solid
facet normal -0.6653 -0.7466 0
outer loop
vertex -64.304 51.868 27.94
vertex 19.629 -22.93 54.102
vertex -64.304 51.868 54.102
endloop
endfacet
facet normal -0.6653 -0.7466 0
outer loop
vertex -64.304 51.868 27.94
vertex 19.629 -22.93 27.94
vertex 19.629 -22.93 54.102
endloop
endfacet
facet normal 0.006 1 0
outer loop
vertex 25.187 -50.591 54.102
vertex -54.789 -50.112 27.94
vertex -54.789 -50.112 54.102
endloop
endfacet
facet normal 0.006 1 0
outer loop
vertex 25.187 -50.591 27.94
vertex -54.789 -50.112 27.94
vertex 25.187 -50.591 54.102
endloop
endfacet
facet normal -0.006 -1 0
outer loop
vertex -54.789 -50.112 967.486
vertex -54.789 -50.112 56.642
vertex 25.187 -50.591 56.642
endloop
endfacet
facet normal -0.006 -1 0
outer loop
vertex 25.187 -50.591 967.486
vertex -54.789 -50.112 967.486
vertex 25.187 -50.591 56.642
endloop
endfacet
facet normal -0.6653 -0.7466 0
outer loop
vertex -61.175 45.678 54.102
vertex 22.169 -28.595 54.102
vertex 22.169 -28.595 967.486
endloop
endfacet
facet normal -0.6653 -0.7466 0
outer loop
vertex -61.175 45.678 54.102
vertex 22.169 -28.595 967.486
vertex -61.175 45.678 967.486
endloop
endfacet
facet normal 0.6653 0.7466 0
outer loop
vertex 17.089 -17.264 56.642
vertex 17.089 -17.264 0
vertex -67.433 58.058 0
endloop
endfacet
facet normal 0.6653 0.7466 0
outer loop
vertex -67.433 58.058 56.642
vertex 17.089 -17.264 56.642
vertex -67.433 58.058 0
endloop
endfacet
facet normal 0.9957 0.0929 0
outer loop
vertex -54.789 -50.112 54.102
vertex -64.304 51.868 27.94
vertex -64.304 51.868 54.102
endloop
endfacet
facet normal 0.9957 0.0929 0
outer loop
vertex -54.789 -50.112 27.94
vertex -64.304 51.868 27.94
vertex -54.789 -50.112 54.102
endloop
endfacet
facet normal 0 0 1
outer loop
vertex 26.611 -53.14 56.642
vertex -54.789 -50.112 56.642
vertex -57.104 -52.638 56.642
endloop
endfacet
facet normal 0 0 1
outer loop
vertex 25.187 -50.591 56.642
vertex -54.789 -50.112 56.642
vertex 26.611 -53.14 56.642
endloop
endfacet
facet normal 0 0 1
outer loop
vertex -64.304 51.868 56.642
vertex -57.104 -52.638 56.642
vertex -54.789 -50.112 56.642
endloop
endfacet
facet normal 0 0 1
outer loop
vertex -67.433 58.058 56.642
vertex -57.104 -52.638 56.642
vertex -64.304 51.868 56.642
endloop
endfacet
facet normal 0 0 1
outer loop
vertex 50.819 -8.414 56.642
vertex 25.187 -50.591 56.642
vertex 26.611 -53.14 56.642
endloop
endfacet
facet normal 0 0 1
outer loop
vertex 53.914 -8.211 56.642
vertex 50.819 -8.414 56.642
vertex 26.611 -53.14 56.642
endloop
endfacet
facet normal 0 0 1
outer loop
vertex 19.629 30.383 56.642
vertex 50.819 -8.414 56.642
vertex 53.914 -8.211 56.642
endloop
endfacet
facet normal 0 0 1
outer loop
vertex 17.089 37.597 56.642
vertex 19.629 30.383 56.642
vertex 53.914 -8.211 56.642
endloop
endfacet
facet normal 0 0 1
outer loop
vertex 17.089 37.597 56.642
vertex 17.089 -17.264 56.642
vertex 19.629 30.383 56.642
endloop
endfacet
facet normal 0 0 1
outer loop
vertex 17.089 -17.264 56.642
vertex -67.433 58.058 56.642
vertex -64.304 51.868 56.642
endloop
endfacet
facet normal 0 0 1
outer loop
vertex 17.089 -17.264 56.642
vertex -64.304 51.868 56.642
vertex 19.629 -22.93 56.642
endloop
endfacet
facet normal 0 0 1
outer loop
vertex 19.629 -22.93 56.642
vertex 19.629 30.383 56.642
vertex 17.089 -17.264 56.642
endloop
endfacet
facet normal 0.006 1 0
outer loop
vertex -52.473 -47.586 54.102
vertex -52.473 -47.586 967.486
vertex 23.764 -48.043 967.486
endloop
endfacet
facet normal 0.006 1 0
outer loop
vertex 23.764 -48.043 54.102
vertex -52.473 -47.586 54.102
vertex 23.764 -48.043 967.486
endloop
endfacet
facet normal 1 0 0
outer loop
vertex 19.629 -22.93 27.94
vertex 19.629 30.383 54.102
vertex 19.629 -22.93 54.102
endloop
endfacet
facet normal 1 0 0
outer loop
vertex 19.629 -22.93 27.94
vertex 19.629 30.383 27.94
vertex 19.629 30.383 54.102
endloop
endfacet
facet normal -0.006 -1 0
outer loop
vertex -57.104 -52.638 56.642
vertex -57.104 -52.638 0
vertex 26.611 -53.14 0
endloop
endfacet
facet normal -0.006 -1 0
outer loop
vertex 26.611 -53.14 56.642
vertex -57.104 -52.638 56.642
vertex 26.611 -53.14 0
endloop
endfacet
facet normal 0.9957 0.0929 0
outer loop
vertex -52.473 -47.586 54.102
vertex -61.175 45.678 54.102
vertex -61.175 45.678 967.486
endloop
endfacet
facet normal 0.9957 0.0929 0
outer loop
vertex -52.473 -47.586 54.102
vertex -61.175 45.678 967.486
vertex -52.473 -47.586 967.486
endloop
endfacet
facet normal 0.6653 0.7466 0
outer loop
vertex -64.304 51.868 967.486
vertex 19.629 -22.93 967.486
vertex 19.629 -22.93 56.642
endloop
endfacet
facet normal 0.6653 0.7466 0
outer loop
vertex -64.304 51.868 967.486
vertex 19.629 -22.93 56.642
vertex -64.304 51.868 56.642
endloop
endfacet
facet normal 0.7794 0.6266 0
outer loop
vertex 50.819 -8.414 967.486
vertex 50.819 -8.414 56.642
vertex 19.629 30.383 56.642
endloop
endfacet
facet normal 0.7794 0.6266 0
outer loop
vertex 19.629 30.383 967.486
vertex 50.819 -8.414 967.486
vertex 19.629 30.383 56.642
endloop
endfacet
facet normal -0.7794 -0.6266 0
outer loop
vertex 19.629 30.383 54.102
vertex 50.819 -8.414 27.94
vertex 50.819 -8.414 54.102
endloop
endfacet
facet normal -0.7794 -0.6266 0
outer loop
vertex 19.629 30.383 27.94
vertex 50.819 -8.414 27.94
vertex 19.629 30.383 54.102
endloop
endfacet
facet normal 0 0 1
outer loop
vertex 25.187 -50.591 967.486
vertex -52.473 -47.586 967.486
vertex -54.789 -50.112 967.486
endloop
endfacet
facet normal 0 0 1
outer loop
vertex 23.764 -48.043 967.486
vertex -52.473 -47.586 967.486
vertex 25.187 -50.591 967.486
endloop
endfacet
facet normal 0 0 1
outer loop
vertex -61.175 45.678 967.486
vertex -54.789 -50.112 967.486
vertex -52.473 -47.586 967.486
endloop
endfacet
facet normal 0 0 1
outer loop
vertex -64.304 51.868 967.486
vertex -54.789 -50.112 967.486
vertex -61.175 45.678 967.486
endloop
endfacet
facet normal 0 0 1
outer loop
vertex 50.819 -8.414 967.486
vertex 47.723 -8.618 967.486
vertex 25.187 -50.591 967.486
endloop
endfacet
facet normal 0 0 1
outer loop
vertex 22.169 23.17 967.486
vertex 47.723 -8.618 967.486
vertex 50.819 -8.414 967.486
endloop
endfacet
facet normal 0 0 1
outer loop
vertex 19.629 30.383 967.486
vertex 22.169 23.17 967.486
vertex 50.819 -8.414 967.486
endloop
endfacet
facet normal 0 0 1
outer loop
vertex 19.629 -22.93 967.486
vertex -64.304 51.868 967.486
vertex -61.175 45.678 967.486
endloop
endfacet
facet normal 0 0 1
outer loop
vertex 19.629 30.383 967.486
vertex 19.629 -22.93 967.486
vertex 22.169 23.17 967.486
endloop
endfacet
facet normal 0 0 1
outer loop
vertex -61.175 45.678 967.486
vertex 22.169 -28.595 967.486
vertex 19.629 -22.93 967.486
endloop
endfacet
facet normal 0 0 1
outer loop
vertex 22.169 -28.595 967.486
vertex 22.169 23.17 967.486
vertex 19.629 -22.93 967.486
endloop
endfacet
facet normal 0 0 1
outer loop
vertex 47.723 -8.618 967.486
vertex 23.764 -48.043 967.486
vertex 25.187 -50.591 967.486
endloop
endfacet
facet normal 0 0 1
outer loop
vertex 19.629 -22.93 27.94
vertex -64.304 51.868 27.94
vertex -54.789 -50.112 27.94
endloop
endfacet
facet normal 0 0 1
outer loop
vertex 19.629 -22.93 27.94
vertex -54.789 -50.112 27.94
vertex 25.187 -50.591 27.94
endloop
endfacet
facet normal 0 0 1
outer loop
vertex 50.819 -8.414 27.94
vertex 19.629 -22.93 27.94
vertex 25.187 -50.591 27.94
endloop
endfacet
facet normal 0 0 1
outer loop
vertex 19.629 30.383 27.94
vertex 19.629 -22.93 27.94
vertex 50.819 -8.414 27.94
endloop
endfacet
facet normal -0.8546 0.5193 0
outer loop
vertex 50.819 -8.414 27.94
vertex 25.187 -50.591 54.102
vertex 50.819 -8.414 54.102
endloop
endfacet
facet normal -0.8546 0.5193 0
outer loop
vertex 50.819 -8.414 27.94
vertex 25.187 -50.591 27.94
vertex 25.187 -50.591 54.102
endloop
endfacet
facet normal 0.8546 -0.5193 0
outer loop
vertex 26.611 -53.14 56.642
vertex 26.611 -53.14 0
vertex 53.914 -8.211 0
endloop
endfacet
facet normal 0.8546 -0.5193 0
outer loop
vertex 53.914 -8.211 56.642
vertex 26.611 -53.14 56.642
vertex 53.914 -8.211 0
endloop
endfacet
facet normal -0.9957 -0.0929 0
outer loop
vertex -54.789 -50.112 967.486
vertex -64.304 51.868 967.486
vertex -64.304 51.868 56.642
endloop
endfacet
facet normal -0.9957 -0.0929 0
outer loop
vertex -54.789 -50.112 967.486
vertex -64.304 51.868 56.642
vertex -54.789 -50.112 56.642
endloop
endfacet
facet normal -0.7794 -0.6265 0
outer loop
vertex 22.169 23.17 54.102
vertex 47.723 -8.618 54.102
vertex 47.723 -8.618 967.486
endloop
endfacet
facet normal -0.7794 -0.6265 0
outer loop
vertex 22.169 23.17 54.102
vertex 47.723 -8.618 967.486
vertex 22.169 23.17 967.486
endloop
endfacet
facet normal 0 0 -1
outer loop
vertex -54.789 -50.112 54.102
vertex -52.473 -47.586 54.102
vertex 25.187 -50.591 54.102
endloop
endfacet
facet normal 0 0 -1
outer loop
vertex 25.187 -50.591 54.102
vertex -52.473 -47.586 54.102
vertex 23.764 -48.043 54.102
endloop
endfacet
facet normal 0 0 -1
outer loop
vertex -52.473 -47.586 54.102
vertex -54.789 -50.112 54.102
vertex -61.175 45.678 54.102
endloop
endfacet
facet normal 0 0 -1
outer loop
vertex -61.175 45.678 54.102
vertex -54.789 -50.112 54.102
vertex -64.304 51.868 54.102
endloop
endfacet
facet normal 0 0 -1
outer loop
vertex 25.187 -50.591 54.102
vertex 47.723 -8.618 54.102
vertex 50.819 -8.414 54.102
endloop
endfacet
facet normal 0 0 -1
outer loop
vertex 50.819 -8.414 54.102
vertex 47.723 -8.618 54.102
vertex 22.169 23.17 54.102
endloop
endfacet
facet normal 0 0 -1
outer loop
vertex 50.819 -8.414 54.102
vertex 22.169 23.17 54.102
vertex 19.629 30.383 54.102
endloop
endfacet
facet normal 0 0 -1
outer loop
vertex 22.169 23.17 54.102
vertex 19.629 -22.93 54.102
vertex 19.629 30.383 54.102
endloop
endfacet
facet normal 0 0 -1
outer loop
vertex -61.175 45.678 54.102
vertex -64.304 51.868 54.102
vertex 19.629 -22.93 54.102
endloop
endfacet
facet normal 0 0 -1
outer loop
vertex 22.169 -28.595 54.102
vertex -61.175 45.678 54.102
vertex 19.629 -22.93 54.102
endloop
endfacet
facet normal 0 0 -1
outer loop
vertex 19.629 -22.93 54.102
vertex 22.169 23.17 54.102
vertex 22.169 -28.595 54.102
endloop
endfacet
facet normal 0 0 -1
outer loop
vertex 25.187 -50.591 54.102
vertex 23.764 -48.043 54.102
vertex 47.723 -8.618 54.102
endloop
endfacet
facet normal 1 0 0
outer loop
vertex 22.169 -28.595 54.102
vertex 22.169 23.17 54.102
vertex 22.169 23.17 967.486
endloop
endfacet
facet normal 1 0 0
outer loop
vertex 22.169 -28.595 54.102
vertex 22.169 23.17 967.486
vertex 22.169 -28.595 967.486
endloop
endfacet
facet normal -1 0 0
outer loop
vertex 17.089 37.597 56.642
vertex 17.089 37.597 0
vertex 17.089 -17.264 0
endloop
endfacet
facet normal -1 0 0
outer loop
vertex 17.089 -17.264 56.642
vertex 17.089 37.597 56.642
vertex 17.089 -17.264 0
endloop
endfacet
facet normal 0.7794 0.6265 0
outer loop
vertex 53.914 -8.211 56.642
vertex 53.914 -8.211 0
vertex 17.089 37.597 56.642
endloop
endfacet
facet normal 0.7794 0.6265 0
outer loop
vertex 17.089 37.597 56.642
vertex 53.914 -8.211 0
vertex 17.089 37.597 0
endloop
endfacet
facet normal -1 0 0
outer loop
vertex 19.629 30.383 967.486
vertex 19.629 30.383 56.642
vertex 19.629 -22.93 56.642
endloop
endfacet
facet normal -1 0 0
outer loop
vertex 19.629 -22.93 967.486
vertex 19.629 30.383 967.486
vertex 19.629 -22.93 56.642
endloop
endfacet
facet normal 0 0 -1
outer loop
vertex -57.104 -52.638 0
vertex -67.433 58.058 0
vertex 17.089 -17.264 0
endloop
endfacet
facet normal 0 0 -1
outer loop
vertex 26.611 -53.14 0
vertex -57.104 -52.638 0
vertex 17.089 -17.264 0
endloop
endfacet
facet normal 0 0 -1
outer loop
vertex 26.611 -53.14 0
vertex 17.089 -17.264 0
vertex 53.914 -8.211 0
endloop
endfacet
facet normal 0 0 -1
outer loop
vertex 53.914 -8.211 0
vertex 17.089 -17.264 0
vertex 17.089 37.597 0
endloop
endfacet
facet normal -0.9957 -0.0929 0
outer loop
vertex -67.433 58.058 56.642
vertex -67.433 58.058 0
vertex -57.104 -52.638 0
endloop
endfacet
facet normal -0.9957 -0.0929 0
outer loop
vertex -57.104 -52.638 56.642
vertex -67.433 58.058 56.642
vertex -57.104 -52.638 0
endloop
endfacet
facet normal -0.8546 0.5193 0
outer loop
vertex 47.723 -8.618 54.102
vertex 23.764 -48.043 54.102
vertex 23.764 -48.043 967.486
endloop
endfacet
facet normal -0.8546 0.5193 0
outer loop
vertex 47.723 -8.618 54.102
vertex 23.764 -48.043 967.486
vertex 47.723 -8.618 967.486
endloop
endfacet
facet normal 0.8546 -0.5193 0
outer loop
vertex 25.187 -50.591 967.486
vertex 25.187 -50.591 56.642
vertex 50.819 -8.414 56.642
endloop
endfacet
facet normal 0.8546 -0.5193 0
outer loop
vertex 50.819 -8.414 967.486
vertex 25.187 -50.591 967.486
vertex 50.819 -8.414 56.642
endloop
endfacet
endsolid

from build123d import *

# Parameters (mm, degrees)
F1_DEPTH = 56.642
F2_T     = -2.54
F3_DEPTH = 964.946
F4_T     = -2.54
F5_DEPTH = 25.4


with BuildPart() as f1:
    # F0 (on Top) → F1 (new body)
    with BuildSketch(Plane.XY):
        Polygon((-67.4327090383, 58.0582357943), (-57.1041107178, -52.6384785771), (26.6108643264, -53.1400032341), (53.9143458009, -8.2113463432), (17.0889906585, 37.5968702137), (17.0889906585, -17.2638874501), align=None)
    extrude(amount=F1_DEPTH)

    # F2
    f2_openings = [f1.faces().sort_by_distance(p)[0] for p in [
        (-14.363831, -12.367538, 56.642),
    ]]
    offset(amount=F2_T, openings=f2_openings, kind=Kind.INTERSECTION)

    # F3 (add): a face of the model
    f3_faces = [f1.faces().sort_by_distance(p)[0] for p in [
        (-14.8087693104, -13.6414291388, 2.54),
    ]]
    extrude(f3_faces, amount=F3_DEPTH)

    # F4
    f4_openings = [f1.faces().sort_by_distance(p)[0] for p in [
        (-14.808769, -13.641429, 967.486),
    ]]
    offset(amount=F4_T, openings=f4_openings, kind=Kind.INTERSECTION)

    # F0 (on Top) + F4_face (on face) → F5 (join)
    with BuildSketch(Plane.XY):
        Polygon((-67.4327090383, 58.0582357943), (-57.1041107178, -52.6384785771), (26.6108643264, -53.1400032341), (53.9143458009, -8.2113463432), (17.0889906585, 37.5968702137), (17.0889906585, -17.2638874501), align=None)
    with BuildSketch(Plane(origin=(-14.8087693104, -13.6414291388, 2.54), x_dir=(1, 0, 0), z_dir=(0, 0, 1))):
        Polygon((34.4377599689, -9.2882337449), (-49.4953159873, 65.509333201), (-39.980014566, -36.4708746559), (39.9961774627, -36.950000789), (65.6274259115, 5.2269490011), (34.4377599689, 44.024754652), align=None)
    extrude(amount=F5_DEPTH)


solid = f1.part
